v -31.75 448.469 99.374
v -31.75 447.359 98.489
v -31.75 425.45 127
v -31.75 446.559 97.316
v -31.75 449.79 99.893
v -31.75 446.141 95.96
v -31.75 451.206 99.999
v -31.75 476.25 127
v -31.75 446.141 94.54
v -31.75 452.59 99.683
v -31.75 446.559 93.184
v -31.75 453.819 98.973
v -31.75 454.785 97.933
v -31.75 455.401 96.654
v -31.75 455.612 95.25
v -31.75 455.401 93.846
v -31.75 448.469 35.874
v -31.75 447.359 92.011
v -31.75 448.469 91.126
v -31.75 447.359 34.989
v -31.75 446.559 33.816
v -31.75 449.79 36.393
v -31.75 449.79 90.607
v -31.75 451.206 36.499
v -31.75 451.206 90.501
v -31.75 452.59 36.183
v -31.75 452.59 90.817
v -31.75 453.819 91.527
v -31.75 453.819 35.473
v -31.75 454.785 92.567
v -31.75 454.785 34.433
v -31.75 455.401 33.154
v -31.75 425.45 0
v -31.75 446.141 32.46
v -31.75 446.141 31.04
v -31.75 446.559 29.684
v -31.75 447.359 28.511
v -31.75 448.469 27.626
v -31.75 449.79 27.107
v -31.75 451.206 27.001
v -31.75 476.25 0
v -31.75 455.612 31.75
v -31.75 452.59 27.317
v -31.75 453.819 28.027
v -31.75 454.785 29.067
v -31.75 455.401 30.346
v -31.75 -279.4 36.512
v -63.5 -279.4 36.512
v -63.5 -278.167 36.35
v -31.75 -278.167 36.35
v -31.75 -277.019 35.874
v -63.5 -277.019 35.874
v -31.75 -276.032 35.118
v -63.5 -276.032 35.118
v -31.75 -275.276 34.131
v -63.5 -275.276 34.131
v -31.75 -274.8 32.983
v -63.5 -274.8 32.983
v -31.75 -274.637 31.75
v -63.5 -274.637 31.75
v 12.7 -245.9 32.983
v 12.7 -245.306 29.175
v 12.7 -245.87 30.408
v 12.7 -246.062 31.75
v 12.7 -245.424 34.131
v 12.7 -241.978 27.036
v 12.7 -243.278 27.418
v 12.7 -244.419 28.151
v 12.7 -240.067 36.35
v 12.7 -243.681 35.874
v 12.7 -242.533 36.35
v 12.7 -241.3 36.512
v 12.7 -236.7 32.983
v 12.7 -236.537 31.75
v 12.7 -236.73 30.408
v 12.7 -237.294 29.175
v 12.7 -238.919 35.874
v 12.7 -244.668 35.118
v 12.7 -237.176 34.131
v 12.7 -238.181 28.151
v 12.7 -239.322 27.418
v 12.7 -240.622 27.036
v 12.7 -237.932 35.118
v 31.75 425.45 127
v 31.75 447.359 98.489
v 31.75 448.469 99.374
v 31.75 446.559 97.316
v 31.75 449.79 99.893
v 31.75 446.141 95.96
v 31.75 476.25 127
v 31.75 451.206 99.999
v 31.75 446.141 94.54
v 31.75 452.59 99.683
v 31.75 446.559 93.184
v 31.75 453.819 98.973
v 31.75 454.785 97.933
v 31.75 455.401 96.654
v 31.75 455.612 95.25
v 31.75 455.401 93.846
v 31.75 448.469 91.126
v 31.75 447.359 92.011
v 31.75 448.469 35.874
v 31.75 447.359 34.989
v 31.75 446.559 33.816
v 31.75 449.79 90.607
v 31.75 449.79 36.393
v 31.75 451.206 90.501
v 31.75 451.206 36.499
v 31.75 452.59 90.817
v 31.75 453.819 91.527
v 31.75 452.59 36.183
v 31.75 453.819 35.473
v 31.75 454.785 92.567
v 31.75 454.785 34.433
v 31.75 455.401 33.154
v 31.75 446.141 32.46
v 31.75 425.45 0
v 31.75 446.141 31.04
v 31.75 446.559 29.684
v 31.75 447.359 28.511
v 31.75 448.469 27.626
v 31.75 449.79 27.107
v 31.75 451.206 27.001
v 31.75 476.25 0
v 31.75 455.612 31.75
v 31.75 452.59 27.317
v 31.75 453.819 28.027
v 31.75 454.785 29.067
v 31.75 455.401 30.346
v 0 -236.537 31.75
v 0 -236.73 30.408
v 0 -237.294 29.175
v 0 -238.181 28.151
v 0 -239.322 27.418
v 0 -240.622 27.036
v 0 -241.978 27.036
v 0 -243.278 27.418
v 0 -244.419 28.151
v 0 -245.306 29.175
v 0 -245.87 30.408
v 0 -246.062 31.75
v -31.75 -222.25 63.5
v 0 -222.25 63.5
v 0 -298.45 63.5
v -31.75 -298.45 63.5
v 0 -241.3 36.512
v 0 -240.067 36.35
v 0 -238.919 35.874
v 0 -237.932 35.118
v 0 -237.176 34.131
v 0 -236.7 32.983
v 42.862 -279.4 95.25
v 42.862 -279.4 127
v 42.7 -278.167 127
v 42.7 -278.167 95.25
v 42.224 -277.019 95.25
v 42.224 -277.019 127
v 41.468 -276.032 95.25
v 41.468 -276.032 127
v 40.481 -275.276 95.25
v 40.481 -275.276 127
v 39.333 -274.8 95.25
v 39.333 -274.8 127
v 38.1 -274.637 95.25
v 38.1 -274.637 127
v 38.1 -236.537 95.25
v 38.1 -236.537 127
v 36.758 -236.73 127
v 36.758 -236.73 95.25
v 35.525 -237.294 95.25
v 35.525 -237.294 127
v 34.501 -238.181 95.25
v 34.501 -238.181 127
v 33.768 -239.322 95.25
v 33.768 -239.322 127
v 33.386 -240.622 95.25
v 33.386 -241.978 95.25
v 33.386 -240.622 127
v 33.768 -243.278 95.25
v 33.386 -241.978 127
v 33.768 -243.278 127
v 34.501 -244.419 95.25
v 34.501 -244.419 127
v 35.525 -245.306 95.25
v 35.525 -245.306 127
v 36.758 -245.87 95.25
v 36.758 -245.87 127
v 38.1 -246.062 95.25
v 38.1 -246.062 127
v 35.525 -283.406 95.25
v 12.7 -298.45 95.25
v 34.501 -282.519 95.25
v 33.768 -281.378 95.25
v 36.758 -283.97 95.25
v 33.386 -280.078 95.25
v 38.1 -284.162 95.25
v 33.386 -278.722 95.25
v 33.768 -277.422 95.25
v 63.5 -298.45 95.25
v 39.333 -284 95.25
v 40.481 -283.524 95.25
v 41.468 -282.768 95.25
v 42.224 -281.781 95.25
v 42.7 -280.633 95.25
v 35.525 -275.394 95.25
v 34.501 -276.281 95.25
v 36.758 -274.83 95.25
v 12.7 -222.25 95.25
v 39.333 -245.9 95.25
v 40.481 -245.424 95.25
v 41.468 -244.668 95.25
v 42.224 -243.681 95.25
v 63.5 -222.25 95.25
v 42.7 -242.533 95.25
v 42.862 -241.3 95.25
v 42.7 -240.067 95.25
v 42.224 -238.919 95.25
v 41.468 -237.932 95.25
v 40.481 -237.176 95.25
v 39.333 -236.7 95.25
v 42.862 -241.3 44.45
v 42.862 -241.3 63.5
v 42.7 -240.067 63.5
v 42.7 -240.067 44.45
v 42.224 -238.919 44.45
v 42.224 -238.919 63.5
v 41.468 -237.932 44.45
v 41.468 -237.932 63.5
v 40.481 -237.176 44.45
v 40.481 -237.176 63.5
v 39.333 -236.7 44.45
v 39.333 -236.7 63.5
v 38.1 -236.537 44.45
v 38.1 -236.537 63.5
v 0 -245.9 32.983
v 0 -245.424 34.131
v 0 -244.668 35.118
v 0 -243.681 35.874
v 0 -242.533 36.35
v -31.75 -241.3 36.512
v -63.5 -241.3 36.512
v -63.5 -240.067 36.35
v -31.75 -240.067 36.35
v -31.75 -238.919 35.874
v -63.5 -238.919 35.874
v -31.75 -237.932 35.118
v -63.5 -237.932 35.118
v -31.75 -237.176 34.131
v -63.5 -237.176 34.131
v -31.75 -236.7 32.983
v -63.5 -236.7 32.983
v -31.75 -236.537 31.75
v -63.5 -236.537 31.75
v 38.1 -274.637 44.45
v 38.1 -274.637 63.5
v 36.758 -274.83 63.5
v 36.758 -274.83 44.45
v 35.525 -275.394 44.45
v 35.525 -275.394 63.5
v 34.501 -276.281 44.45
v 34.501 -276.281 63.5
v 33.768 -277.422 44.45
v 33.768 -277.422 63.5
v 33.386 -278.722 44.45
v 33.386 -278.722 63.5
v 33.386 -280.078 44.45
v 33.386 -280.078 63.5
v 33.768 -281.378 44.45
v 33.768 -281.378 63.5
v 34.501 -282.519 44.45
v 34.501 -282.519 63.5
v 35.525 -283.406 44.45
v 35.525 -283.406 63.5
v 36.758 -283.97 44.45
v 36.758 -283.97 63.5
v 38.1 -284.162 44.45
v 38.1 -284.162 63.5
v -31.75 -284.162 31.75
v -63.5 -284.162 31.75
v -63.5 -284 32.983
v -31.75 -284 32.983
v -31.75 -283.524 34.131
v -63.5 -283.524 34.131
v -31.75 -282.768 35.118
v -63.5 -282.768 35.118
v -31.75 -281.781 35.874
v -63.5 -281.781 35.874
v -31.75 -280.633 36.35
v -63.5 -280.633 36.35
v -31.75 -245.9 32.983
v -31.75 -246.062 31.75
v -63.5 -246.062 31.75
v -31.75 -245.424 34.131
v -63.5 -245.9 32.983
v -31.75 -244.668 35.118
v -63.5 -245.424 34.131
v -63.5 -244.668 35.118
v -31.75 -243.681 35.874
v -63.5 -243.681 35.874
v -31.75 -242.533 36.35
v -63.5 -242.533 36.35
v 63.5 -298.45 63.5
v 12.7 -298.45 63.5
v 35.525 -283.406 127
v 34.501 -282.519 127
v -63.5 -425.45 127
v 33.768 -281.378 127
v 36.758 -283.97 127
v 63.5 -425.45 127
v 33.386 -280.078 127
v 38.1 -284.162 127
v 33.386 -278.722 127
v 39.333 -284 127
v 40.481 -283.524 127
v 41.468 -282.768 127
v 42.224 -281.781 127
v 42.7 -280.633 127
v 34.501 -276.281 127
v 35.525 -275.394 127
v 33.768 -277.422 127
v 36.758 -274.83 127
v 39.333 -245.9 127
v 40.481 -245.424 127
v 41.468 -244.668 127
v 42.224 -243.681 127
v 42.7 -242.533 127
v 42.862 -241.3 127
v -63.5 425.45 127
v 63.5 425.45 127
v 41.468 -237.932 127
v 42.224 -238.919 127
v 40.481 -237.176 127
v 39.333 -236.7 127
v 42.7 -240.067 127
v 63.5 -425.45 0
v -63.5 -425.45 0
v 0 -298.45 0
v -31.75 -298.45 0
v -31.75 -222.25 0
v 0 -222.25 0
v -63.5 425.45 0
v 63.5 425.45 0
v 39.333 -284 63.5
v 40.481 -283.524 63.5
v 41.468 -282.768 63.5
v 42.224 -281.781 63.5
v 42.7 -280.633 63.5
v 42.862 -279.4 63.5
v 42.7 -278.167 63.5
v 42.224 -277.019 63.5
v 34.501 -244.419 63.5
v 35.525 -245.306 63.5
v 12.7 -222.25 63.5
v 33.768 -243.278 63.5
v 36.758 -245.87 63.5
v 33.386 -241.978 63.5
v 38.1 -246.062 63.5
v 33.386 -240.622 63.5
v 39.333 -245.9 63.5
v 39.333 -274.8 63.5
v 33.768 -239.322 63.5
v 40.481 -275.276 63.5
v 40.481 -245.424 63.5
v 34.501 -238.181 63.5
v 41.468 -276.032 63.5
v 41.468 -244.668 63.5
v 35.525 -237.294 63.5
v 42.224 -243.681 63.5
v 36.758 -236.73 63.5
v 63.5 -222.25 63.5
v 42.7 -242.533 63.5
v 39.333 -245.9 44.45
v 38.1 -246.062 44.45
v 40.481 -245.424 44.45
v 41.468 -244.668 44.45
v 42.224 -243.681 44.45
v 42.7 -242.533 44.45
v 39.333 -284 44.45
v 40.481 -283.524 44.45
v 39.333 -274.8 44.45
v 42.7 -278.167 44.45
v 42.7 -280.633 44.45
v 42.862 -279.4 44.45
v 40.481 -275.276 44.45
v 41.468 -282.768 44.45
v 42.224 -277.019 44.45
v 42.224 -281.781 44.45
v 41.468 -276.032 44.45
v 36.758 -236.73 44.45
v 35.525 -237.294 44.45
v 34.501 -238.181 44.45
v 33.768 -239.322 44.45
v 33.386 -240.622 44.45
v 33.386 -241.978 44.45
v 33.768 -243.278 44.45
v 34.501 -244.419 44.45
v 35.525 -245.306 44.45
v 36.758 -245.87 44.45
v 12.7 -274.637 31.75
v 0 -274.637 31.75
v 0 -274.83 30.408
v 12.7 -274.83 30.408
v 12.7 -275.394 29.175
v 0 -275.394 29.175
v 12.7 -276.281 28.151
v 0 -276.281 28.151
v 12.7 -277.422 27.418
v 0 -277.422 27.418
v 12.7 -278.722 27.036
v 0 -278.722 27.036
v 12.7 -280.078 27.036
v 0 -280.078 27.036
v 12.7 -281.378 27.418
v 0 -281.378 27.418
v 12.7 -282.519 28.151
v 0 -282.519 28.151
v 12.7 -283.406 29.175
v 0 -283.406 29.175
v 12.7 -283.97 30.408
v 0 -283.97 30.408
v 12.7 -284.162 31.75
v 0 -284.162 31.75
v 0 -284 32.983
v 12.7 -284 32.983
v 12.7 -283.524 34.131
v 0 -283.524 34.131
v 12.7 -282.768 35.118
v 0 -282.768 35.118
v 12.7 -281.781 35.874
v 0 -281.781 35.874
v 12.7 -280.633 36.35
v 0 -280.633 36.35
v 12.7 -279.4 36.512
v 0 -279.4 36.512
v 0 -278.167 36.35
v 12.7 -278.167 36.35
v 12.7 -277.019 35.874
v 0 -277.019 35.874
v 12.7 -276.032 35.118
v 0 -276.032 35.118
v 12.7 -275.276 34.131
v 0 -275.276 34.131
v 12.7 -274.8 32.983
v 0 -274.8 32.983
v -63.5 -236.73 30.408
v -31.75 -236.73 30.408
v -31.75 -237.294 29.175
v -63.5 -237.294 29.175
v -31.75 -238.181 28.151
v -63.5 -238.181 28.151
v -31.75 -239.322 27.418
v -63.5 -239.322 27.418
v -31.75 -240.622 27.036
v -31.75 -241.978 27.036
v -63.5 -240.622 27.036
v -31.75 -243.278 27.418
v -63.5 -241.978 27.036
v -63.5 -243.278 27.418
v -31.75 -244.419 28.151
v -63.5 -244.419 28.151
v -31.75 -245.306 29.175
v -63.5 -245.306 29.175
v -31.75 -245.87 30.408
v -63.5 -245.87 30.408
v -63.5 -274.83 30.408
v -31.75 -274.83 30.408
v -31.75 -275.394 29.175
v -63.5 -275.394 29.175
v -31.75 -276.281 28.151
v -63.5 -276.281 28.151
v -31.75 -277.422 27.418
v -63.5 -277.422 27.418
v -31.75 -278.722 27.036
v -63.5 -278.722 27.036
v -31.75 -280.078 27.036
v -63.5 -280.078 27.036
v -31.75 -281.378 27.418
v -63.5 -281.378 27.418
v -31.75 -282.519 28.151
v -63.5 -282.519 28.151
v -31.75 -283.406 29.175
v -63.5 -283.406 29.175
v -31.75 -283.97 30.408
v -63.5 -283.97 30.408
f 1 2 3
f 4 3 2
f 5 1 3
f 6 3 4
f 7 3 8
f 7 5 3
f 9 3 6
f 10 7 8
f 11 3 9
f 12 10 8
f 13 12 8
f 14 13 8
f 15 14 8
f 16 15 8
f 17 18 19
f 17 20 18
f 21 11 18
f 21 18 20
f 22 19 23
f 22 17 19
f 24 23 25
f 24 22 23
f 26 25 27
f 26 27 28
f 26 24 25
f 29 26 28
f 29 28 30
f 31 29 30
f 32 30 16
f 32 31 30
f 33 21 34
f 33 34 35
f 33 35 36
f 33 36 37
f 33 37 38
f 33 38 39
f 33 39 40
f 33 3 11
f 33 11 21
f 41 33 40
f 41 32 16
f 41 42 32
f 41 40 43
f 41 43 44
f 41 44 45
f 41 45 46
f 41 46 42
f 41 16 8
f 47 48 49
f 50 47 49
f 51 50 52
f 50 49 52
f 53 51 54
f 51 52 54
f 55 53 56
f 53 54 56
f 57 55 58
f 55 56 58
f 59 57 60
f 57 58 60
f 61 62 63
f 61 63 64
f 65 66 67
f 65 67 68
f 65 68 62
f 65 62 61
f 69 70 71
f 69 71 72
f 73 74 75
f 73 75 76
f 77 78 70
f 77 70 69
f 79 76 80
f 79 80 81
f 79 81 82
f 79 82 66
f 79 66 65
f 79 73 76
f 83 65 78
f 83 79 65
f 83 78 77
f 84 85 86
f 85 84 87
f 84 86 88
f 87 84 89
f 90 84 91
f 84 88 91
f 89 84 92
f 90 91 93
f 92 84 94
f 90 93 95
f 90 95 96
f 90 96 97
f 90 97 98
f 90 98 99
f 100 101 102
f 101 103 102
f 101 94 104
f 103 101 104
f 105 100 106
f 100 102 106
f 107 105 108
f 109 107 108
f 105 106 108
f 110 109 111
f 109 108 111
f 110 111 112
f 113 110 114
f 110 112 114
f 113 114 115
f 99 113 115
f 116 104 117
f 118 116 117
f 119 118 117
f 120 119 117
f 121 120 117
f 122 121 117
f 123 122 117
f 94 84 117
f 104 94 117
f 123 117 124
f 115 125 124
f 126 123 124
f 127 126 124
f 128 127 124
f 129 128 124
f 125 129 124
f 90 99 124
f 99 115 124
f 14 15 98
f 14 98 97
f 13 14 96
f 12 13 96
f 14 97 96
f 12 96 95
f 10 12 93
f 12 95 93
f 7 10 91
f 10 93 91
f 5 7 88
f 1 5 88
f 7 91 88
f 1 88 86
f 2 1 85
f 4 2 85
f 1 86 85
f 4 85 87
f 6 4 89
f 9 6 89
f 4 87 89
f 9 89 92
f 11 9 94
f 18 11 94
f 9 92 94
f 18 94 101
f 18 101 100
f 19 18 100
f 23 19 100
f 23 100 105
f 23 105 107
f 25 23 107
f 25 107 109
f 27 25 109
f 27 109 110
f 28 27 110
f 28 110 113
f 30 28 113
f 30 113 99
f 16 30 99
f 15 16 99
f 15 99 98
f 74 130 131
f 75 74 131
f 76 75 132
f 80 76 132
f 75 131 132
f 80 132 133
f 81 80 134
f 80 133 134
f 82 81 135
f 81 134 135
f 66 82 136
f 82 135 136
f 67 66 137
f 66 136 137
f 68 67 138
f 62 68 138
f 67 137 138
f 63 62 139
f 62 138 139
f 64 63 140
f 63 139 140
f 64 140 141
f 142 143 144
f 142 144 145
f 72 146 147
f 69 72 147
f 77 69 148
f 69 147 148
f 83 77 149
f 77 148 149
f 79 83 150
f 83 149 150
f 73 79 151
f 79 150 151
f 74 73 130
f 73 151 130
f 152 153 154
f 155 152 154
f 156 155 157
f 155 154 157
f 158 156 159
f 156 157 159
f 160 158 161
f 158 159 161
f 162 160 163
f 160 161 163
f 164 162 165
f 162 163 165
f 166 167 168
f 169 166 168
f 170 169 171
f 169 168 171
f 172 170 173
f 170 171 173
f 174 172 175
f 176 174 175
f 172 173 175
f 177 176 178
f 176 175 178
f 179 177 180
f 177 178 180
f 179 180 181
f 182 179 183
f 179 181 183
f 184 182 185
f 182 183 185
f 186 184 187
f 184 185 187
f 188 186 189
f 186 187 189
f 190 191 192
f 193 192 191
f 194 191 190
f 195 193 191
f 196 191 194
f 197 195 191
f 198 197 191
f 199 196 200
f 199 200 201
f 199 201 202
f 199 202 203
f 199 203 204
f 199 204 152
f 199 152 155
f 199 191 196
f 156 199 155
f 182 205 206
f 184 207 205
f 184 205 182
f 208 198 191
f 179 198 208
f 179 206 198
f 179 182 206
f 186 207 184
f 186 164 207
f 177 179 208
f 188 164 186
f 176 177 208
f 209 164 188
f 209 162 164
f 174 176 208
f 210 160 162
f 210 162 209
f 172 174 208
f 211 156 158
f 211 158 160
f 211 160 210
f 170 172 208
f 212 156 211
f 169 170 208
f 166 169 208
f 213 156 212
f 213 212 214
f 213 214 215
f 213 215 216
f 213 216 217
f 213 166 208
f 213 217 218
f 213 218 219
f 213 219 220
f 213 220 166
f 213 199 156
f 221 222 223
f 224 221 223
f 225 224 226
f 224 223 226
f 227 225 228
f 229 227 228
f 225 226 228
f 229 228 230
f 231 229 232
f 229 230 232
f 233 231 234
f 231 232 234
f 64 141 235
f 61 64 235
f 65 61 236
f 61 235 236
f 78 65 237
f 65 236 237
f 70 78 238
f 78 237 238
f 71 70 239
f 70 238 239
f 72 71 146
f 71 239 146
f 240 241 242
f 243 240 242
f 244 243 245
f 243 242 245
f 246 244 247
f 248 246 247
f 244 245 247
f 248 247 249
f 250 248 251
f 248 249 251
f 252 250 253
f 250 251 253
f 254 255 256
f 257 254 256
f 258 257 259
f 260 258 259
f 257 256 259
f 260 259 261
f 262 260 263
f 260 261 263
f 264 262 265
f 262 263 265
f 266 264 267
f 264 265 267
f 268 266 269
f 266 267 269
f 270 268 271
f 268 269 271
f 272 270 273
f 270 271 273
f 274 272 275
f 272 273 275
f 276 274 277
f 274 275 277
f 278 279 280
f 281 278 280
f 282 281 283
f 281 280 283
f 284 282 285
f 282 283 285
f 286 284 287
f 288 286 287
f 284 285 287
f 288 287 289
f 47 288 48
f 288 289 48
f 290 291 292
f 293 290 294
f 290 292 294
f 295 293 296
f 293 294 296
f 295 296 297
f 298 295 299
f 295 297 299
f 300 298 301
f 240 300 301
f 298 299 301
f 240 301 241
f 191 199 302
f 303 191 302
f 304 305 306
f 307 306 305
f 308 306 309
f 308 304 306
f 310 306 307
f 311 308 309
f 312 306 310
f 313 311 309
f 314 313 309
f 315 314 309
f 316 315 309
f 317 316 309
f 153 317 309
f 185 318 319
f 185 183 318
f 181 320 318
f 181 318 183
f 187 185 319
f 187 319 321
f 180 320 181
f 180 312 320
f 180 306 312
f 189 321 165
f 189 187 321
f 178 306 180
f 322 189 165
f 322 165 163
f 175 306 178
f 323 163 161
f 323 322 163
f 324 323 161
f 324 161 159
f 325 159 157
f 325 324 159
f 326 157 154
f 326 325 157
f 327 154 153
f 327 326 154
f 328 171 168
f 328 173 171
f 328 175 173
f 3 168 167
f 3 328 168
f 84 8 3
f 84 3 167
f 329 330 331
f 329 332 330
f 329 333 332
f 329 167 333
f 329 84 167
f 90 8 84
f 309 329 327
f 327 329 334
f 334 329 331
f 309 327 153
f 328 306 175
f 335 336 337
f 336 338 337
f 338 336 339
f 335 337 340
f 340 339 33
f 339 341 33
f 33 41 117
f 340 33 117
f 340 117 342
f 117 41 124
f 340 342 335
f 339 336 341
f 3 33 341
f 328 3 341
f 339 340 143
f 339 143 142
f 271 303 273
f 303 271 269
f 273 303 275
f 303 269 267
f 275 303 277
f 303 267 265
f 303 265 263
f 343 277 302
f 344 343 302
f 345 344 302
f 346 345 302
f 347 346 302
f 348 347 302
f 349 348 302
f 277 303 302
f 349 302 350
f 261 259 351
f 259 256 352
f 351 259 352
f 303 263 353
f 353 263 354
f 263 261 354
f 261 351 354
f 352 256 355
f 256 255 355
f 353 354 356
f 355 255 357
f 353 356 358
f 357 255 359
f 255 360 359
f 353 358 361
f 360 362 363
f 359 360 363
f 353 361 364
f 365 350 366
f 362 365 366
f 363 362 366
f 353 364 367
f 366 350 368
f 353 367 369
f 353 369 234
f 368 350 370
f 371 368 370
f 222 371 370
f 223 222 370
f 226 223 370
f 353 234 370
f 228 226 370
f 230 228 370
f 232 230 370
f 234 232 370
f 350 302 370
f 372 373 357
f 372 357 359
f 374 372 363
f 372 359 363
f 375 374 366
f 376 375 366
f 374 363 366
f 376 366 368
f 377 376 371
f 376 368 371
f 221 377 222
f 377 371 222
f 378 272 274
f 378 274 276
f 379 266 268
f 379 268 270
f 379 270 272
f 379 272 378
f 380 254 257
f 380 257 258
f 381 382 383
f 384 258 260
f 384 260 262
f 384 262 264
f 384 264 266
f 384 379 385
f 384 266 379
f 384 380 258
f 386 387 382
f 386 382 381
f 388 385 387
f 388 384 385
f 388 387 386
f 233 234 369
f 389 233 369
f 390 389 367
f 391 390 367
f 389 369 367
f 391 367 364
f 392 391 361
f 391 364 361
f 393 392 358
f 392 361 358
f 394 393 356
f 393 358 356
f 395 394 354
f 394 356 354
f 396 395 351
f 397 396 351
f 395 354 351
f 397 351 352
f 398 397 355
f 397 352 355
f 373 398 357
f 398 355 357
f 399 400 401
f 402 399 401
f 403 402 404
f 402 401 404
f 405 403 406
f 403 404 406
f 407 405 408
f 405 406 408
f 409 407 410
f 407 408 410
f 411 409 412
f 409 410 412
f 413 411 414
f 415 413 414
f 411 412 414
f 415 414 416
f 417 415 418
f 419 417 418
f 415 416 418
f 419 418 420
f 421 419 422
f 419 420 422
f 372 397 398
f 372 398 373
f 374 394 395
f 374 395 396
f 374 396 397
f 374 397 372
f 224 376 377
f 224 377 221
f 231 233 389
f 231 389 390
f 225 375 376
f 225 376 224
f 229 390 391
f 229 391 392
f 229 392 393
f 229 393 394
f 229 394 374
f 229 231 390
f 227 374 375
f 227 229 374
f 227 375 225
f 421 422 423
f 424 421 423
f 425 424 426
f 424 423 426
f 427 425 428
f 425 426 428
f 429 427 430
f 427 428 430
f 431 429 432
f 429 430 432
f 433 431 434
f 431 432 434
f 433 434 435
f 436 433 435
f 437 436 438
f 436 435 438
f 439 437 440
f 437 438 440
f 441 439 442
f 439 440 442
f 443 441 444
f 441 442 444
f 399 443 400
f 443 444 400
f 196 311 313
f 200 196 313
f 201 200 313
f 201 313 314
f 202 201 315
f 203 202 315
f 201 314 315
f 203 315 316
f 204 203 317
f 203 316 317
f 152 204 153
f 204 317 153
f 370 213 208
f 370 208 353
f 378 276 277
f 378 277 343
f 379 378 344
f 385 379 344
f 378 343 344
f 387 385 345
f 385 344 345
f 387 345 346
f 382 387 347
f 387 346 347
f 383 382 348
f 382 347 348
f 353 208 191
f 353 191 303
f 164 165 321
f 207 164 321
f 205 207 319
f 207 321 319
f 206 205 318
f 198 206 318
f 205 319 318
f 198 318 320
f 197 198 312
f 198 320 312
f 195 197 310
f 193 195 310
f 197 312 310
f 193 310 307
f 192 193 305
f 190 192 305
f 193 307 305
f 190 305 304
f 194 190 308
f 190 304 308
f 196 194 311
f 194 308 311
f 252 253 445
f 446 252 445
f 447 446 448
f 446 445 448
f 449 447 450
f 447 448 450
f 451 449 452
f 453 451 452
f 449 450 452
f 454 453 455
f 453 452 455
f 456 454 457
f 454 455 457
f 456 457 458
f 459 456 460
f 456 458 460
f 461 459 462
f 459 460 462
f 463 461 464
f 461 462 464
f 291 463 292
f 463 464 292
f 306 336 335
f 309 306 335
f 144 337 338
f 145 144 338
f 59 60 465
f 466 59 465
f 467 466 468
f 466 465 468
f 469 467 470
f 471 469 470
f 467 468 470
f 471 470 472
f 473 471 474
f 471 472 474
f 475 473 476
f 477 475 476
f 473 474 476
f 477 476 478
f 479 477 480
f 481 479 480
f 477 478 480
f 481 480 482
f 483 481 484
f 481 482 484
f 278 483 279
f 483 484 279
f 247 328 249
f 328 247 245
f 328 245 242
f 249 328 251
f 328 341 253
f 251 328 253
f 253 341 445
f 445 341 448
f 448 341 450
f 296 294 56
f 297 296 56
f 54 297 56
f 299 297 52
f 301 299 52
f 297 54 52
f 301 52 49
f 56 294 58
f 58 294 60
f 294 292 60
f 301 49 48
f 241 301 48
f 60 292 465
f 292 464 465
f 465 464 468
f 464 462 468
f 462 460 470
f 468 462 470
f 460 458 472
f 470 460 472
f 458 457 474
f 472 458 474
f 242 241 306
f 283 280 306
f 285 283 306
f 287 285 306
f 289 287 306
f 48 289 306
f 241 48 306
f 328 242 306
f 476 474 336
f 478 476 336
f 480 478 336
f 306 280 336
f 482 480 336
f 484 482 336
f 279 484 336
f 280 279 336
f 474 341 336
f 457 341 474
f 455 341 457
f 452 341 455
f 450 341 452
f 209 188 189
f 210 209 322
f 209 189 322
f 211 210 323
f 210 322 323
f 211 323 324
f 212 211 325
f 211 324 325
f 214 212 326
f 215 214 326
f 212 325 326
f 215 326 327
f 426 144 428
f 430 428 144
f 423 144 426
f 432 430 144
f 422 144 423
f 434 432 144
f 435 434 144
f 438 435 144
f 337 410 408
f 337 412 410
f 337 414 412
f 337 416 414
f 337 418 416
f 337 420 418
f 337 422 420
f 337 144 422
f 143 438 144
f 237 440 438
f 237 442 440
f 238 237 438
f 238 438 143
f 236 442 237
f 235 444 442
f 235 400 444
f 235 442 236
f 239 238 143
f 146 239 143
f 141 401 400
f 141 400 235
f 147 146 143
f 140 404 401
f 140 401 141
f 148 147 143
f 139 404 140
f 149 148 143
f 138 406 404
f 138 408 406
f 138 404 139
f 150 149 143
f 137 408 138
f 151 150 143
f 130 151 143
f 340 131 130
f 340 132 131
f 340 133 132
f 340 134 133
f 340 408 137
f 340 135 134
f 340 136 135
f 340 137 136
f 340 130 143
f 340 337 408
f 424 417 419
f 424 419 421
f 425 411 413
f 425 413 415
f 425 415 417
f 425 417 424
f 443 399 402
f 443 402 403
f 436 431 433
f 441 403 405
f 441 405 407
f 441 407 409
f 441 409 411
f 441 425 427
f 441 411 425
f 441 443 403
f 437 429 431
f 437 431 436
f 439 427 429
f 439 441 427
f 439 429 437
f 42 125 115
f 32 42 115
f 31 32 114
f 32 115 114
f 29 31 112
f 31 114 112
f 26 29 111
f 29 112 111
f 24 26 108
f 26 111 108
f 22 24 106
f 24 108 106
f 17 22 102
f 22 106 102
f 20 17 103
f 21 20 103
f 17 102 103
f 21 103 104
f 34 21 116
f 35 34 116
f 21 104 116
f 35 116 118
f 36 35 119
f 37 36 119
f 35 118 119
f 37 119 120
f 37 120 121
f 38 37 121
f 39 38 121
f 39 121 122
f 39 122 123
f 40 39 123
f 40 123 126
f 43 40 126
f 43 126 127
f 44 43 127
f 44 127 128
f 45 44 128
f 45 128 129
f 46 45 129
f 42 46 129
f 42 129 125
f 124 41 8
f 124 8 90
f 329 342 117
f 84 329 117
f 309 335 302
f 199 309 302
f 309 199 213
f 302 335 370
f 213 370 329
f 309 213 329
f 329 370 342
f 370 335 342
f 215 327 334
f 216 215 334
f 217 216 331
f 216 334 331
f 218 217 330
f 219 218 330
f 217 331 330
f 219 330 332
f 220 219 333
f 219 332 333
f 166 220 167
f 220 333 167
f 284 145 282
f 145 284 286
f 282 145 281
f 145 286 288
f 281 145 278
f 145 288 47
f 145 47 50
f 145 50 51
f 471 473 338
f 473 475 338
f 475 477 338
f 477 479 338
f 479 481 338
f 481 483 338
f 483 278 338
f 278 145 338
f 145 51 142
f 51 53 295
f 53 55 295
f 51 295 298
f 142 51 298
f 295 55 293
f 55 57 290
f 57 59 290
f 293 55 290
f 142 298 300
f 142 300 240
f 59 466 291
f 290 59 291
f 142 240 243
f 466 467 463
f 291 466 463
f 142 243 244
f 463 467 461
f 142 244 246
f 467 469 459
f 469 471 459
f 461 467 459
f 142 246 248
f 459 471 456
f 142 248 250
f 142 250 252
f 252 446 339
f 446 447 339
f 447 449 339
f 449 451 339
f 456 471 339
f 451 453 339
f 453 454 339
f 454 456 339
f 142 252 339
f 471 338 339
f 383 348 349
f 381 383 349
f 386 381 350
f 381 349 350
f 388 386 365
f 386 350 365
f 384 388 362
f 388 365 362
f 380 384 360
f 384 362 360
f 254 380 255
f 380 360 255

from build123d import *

# Parameters (mm, degrees)
SKETCH1_W           = 63.5
SKETCH1_H           = 50.8
BOSS_EXTRUDE1_DEPTH = 127
SKETCH2_W           = 31.75
SKETCH2_H           = 76.2
CUT_EXTRUDE1_DEPTH  = 50.8
CUT_EXTRUDE3_DEPTH  = 82.55
SKETCH4_W           = 31.75
SKETCH4_H           = 76.2
CUT_EXTRUDE4_DEPTH  = 63.5
CUT_EXTRUDE5_DEPTH  = 76.2
SKETCH6_R           = 4.7625
CUT_EXTRUDE6_DEPTH  = 503.011578552


with BuildPart() as part:
    # Sketch1 → Boss-Extrude1 (new body)
    with BuildSketch(Plane.XY):
        Polygon((63.5, -425.45), (63.5, 425.45), (31.75, 425.45), (31.75, 374.65), (-31.75, 374.65), (-31.75, 425.45), (-63.5, 425.45), (-63.5, -425.45), align=None)
        with Locations((0, 400.05)):
            Rectangle(SKETCH1_W, SKETCH1_H)
        with Locations((0, 450.85)):
            Rectangle(SKETCH1_W, SKETCH1_H)
    extrude(amount=BOSS_EXTRUDE1_DEPTH)

    # Sketch2 → Cut-Extrude1 (cut)
    with BuildSketch(Plane(origin=(63.5, 0, 0), x_dir=(0, 0, -1), z_dir=(1, 0, 0))):
        with Locations((-79.375, -260.35)):
            Rectangle(SKETCH2_W, SKETCH2_H)
    extrude(amount=-CUT_EXTRUDE1_DEPTH, mode=Mode.SUBTRACT)

    # Sketch3 → Cut-Extrude3 (cut)
    with BuildSketch(Plane.XY.offset(127)):
        with BuildLine():
            ThreePointArc((42.8625, -279.4), (41.467596045, -276.032403955), (38.1, -274.6375))
            Line((38.1, -274.6375), (38.1, -284.1625))
            ThreePointArc((38.1, -284.1625), (41.467596045, -282.767596045), (42.8625, -279.4))
        make_face()
        with BuildLine():
            Line((38.1, -284.1625), (38.1, -274.6375))
            ThreePointArc((38.1, -274.6375), (33.3375, -279.4), (38.1, -284.1625))
        make_face()
        with BuildLine():
            ThreePointArc((42.8625, -241.3), (41.467596045, -237.932403955), (38.1, -236.5375))
            Line((38.1, -236.5375), (38.1, -246.0625))
            ThreePointArc((38.1, -246.0625), (41.467596045, -244.667596045), (42.8625, -241.3))
        make_face()
        with BuildLine():
            Line((38.1, -246.0625), (38.1, -236.5375))
            ThreePointArc((38.1, -236.5375), (33.3375, -241.3), (38.1, -246.0625))
        make_face()
    extrude(amount=-CUT_EXTRUDE3_DEPTH, mode=Mode.SUBTRACT)

    # Sketch4 → Cut-Extrude4 (cut)
    with BuildSketch(Plane(origin=(0, 0, 0), x_dir=(-1, 0, 0), z_dir=(0, 0, -1))):
        with Locations((15.875, -260.35)):
            Rectangle(SKETCH4_W, SKETCH4_H)
    extrude(amount=-CUT_EXTRUDE4_DEPTH, mode=Mode.SUBTRACT)

    # Sketch5 → Cut-Extrude5 (cut)
    with BuildSketch(Plane.ZY.offset(63.5)):
        with BuildLine():
            ThreePointArc((31.75, -236.5375), (26.9875, -241.3), (31.75, -246.0625))
            Line((31.75, -246.0625), (31.75, -236.5375))
        make_face()
        with BuildLine():
            Line((31.75, -236.5375), (31.75, -246.0625))
            ThreePointArc((31.75, -246.0625), (35.117596045, -244.667596045), (36.5125, -241.3))
            ThreePointArc((36.5125, -241.3), (35.117596045, -237.932403955), (31.75, -236.5375))
        make_face()
        with BuildLine():
            ThreePointArc((31.75, -274.6375), (26.9875, -279.4), (31.75, -284.1625))
            Line((31.75, -284.1625), (31.75, -274.6375))
        make_face()
        with BuildLine():
            Line((31.75, -274.6375), (31.75, -284.1625))
            ThreePointArc((31.75, -284.1625), (35.117596045, -282.767596045), (36.5125, -279.4))
            ThreePointArc((36.5125, -279.4), (35.117596045, -276.032403955), (31.75, -274.6375))
        make_face()
    extrude(amount=-CUT_EXTRUDE5_DEPTH, mode=Mode.SUBTRACT)

    # Sketch6 → Cut-Extrude6 (cut, through all)
    with BuildSketch(Plane(origin=(31.75, 0, 0), x_dir=(0, 0, -1), z_dir=(1, 0, 0))):
        with Locations(Location((-95.25, 450.85, 0), (0, 0, 90))):
            Circle(SKETCH6_R)
        with Locations(Location((-31.75, 450.85, 0), (0, 0, 90))):
            Circle(SKETCH6_R)
    extrude(amount=-CUT_EXTRUDE6_DEPTH, mode=Mode.SUBTRACT)


solid = part.part
